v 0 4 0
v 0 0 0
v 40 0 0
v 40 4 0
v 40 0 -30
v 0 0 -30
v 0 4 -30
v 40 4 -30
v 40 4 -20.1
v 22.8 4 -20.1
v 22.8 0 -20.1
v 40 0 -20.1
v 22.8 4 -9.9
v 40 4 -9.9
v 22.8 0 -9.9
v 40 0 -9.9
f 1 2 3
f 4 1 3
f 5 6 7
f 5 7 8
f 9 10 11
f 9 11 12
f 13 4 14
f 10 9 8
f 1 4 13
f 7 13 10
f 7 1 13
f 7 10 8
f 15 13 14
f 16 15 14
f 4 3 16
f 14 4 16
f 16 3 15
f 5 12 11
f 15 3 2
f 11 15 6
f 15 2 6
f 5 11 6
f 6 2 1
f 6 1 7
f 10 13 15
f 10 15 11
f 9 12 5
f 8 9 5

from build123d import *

# Parameters (mm, degrees)
SKETCH_1_W          = 40
SKETCH_1_H          = 30
EXTRUDE_1_DEPTH     = 4
SKETCH_2_W          = 22.2
SKETCH_2_H          = 10.2
CUT_EXTRUDE_1_DEPTH = 10
SKETCH_3_W          = 10.2
SKETCH_3_H          = 4
EXTRUDE_2_DEPTH     = 5


with BuildPart() as part:
    # 草圖1 → 填料-伸長1 (new body)
    with BuildSketch(Plane(origin=(0, 0, 0), x_dir=(1, 0, 0), z_dir=(0, 1, 0))):
        with Locations((20, 15)):
            Rectangle(SKETCH_1_W, SKETCH_1_H)
    extrude(amount=EXTRUDE_1_DEPTH)

    # 草圖2 → 除料-伸長1 (cut)
    with BuildSketch(Plane(origin=(0, 4, 0), x_dir=(1, 0, 0), z_dir=(0, 1, 0))):
        with Locations((28.9, 15)):
            Rectangle(SKETCH_2_W, SKETCH_2_H)
    extrude(amount=-CUT_EXTRUDE_1_DEPTH, mode=Mode.SUBTRACT)

    # 草圖3 → 填料-伸長2 (add)
    with BuildSketch(Plane(origin=(17.8, 0, 0), x_dir=(0, 0, -1), z_dir=(1, 0, 0))):
        with Locations((15, 2)):
            Rectangle(SKETCH_3_W, SKETCH_3_H)
    extrude(amount=EXTRUDE_2_DEPTH)


solid = part.part
